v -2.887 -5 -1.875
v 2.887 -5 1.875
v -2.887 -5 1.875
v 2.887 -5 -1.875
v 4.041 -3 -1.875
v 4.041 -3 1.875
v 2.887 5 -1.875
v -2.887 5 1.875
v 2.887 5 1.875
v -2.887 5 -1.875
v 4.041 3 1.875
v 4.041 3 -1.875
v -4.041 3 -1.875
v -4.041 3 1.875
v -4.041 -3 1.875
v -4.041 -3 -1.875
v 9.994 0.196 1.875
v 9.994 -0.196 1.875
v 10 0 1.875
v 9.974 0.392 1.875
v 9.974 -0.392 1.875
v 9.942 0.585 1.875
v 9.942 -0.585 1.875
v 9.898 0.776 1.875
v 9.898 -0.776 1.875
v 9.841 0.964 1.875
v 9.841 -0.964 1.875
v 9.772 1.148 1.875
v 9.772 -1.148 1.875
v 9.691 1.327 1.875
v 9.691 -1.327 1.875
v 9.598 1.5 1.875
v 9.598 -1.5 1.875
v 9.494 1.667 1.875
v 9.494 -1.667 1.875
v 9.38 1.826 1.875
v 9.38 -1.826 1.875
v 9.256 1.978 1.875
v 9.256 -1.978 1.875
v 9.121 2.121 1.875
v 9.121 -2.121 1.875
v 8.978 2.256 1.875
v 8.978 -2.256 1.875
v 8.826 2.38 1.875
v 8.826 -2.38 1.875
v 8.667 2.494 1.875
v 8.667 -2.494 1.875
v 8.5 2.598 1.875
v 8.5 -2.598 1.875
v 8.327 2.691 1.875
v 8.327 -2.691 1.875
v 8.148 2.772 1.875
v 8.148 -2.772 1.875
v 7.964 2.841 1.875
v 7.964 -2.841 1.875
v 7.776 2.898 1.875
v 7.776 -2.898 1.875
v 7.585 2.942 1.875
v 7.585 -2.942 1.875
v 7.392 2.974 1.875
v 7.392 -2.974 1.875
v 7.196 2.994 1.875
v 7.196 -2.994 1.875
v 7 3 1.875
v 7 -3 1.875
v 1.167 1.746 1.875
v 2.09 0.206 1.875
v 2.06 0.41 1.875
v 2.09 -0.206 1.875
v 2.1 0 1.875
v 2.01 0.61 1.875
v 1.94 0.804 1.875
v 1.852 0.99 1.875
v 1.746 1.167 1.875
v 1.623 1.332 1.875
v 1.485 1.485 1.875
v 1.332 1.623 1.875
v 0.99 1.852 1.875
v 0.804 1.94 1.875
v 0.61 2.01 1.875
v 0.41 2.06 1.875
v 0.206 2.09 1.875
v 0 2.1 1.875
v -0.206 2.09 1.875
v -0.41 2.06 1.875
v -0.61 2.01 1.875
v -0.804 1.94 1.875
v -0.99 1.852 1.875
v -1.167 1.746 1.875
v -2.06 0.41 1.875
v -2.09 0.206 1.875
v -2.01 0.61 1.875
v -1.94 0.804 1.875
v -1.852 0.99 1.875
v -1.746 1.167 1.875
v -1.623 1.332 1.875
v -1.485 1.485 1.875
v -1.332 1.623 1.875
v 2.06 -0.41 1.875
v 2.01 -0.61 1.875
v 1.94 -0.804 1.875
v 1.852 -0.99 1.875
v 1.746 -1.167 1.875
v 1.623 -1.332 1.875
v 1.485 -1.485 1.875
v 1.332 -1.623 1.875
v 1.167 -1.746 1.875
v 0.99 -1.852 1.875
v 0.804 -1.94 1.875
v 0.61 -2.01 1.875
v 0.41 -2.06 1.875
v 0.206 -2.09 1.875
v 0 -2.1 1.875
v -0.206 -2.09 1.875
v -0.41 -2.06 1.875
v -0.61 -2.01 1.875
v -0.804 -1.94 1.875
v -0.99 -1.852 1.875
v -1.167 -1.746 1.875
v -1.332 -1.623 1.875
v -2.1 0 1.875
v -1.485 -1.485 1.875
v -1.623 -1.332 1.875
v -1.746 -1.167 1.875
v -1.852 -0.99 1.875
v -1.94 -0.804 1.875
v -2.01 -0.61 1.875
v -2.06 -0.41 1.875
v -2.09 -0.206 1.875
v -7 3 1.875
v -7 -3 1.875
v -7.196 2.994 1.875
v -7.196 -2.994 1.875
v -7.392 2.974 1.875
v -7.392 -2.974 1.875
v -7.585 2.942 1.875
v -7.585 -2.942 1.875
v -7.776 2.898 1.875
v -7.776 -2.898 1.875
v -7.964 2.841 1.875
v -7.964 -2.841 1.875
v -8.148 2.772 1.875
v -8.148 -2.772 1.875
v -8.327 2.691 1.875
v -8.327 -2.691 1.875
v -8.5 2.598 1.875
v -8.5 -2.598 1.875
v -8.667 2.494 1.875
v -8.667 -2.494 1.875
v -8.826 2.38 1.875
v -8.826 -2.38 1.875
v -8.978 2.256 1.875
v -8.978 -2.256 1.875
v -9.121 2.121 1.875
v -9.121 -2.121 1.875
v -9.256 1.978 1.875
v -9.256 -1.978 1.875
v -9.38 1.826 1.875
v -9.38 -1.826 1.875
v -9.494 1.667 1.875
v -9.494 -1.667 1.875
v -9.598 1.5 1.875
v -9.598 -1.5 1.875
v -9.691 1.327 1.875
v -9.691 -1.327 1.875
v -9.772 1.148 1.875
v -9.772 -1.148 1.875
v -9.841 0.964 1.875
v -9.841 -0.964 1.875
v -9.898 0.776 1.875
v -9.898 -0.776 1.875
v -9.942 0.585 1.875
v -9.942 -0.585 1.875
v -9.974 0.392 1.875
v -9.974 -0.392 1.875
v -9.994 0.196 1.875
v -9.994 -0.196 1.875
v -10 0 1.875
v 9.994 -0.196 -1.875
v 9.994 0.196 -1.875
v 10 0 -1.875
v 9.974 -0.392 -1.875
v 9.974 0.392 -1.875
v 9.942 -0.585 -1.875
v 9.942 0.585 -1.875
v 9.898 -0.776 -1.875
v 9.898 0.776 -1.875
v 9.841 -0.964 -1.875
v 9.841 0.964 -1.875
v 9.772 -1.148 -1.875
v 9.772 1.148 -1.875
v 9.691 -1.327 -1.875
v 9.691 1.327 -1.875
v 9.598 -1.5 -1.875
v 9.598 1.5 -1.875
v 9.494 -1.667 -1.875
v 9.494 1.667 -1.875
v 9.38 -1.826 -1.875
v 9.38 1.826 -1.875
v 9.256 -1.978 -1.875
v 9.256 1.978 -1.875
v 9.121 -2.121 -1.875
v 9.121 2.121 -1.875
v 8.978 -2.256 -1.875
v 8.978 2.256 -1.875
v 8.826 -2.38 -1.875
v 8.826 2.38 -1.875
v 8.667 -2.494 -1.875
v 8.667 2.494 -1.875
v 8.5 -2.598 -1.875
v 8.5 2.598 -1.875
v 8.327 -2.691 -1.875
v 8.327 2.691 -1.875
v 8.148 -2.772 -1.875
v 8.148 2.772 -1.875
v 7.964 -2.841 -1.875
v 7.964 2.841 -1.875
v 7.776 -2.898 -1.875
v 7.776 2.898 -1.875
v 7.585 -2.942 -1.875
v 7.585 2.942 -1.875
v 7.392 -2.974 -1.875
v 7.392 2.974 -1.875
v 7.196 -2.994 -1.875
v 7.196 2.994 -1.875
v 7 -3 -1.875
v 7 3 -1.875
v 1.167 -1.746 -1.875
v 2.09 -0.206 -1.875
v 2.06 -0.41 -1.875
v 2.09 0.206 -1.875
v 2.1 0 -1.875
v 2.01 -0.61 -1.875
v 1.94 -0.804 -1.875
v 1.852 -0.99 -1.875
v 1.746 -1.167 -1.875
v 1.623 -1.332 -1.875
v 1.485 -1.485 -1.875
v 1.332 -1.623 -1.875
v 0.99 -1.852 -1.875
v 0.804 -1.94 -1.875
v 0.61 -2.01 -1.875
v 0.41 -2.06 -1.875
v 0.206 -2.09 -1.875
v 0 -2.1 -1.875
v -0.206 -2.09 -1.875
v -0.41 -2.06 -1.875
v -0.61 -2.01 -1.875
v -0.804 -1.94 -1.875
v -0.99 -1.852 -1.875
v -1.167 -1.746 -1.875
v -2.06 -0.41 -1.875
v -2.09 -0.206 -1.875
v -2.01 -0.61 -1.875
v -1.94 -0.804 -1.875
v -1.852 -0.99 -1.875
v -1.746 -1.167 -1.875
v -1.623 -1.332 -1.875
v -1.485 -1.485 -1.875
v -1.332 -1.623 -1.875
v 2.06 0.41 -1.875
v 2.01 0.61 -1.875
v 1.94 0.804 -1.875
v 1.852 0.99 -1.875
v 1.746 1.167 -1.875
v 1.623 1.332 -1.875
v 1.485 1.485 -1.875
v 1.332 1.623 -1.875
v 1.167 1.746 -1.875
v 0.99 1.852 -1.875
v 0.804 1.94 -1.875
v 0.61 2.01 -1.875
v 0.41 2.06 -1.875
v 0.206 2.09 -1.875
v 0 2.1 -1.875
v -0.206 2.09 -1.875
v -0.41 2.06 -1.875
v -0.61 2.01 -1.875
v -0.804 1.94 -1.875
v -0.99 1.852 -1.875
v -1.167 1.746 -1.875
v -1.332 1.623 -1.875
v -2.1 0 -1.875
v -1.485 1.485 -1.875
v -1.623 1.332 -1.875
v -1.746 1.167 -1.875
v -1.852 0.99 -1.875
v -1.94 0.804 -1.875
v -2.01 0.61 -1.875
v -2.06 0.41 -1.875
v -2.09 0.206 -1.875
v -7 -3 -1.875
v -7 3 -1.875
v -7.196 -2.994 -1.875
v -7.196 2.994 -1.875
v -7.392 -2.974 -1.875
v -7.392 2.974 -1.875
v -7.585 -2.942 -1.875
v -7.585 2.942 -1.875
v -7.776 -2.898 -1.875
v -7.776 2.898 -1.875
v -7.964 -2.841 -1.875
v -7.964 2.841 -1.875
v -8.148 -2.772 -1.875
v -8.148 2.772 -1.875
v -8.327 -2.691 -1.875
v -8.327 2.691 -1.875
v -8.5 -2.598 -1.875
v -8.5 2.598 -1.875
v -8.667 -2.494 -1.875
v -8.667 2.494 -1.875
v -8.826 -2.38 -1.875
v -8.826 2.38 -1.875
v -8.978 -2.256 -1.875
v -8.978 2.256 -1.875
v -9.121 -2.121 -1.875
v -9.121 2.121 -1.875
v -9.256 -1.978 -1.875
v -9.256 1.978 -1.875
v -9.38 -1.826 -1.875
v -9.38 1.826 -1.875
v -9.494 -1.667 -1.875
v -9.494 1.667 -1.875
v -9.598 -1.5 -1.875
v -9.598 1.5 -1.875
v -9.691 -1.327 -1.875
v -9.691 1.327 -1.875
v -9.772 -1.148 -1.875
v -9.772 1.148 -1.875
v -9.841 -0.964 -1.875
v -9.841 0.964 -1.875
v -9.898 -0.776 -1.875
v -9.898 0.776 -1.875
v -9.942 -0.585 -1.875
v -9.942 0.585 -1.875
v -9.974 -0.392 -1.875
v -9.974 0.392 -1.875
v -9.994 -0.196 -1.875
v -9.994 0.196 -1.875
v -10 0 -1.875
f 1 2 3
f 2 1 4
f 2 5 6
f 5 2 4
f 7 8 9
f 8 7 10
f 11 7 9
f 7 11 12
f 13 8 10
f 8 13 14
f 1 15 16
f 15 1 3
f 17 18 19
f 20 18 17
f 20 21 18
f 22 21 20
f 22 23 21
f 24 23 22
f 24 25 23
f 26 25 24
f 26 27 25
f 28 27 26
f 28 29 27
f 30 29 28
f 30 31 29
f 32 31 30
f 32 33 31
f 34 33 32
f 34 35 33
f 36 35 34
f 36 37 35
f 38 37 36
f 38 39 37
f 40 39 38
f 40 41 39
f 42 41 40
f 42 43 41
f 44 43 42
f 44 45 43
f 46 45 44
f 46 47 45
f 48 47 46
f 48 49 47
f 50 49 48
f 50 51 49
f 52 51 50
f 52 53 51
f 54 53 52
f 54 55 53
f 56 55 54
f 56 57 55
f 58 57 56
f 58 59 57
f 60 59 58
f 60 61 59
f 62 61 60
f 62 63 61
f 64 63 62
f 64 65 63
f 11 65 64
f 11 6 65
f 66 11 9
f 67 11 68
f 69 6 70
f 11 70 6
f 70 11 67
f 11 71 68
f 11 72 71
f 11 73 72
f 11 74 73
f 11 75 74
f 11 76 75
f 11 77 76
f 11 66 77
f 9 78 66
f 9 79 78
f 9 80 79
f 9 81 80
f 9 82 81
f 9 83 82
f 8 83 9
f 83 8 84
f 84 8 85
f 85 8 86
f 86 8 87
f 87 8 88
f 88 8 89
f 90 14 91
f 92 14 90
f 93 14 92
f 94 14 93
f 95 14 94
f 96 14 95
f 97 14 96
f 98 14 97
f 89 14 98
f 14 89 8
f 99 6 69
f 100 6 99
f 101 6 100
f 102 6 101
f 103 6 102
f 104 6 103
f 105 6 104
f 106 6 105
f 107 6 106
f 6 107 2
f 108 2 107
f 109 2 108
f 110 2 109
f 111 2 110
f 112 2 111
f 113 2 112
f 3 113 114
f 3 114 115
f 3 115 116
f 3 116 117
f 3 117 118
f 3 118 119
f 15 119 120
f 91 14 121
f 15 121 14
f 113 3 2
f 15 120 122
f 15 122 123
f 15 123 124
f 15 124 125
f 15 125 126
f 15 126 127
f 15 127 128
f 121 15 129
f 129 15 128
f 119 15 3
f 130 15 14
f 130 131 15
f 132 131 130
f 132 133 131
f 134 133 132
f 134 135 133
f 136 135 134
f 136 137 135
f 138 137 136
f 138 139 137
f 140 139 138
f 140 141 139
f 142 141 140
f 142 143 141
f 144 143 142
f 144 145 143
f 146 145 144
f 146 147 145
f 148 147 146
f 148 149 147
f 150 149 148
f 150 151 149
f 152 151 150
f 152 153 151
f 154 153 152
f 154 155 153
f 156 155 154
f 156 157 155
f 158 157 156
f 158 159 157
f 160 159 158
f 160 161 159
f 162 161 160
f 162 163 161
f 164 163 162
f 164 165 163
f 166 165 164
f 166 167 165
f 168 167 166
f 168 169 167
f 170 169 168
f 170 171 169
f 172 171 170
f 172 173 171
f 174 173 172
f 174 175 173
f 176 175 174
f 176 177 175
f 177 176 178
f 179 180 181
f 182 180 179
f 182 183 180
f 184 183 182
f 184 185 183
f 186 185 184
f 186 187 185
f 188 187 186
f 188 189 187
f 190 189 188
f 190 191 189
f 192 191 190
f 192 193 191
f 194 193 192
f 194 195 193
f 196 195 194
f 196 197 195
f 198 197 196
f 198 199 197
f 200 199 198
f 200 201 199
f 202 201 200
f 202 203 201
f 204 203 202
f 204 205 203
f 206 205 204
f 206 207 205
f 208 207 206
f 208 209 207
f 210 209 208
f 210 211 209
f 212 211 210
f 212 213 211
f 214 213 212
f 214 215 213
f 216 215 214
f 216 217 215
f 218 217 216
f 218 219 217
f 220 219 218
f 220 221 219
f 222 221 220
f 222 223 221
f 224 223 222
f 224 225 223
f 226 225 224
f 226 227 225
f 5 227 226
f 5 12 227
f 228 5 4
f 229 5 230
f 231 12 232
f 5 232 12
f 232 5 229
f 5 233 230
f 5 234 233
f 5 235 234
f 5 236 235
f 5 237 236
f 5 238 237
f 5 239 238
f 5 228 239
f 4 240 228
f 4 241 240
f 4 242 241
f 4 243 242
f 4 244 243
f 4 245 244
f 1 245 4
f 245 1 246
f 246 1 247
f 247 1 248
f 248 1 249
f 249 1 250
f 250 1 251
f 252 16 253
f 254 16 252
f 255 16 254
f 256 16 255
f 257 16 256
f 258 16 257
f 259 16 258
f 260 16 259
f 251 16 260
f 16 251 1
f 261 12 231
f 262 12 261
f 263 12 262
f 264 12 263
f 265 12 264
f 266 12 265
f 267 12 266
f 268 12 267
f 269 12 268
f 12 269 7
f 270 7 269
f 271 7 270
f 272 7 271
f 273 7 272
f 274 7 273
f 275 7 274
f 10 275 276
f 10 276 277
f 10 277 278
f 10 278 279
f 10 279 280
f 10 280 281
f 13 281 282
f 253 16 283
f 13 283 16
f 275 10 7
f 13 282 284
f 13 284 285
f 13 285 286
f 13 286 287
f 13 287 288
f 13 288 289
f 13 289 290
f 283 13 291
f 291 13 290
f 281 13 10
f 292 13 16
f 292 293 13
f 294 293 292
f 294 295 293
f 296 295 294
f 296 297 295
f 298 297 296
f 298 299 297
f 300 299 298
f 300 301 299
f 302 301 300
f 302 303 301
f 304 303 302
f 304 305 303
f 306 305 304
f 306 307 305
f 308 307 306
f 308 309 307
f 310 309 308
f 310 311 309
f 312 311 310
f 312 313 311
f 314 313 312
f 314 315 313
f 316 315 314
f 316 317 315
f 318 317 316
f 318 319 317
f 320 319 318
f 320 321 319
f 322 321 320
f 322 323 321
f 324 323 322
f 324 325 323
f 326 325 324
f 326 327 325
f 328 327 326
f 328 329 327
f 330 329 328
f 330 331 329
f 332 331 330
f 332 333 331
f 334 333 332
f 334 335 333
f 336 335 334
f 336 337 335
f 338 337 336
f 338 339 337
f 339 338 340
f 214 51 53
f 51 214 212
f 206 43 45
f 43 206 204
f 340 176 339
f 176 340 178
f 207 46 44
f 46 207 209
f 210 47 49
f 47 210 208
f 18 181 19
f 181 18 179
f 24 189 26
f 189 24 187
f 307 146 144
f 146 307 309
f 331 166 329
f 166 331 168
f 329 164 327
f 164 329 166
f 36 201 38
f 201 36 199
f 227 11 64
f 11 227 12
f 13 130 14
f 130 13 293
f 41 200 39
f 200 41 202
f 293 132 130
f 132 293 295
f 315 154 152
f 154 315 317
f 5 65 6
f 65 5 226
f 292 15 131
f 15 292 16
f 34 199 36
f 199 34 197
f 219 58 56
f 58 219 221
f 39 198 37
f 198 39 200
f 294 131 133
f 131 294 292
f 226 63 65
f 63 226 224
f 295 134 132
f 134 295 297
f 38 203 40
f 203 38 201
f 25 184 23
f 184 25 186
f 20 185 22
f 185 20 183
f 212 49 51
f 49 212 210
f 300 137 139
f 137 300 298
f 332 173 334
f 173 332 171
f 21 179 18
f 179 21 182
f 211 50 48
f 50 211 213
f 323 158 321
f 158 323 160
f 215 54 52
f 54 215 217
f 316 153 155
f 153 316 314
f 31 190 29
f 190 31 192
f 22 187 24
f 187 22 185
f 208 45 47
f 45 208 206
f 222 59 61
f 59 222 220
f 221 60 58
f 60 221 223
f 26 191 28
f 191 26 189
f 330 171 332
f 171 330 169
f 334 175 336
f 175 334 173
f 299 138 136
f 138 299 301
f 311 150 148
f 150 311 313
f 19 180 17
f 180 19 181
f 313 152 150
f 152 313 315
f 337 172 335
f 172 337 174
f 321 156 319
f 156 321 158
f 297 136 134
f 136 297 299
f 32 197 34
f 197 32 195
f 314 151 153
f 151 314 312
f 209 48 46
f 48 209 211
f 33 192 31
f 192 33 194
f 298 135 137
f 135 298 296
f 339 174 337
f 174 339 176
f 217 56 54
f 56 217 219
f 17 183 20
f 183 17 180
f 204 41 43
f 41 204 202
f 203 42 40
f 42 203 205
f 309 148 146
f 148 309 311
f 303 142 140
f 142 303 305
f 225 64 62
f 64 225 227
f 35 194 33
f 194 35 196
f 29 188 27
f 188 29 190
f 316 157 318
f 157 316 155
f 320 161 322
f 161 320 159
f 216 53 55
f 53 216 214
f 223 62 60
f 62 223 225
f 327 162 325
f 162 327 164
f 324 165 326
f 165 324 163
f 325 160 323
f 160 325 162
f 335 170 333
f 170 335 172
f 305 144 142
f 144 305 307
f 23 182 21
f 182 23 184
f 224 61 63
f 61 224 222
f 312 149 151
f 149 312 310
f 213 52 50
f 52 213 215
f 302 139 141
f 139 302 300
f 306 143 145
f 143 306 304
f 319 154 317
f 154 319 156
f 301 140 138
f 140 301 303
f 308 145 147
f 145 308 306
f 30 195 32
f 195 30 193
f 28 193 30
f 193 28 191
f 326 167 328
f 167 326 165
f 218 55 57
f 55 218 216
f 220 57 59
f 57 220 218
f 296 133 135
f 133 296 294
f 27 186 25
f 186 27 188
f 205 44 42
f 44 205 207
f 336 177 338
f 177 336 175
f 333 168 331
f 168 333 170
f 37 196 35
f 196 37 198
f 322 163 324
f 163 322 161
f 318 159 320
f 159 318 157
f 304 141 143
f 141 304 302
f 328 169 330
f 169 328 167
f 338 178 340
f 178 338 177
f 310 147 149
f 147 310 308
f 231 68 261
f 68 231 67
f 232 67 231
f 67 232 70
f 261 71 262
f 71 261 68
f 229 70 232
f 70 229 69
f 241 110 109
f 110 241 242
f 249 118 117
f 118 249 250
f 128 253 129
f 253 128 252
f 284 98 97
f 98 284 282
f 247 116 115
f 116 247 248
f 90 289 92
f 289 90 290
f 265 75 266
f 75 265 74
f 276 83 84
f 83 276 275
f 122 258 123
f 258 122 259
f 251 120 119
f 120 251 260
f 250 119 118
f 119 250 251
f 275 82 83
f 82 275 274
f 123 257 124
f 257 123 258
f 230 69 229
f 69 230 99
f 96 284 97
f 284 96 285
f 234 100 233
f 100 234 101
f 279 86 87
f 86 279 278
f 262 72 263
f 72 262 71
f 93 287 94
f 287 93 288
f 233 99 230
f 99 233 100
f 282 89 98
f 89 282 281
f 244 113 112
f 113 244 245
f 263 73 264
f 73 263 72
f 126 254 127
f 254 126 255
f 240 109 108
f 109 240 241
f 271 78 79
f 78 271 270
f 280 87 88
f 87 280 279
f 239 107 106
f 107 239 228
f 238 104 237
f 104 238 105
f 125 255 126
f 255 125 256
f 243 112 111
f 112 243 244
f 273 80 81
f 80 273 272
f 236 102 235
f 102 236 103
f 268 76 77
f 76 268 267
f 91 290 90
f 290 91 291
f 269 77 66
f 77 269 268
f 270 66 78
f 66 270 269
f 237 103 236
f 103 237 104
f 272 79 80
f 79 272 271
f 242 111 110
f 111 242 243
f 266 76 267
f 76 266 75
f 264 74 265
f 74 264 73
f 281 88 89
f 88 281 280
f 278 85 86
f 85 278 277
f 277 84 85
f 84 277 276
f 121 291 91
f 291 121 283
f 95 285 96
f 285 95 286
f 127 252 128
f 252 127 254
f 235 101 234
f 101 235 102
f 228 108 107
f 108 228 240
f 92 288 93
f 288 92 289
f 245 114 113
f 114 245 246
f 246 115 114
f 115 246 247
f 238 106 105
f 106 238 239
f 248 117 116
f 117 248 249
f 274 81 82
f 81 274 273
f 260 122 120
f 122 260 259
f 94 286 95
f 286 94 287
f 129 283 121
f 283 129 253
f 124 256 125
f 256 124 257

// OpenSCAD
// Wing nut for M4 screw
// Targets: 4.0mm screw (clearance hole), 10.0mm across flats, 3.75mm thick
$fn = 96;

// Parameters
thread_diameter   = 4.0;   // screw major diameter
thread_clearance  = 0.2;   // clearance added to hole diameter
across_flats      = 10.0;  // hex across flats
thickness         = 3.75;  // overall thickness (Z)

wing_span         = 24.0;  // overall tip-to-tip span (X)
wing_width        = 6.0;   // wing width (Y)
wing_tip_radius   = 3.0;   // rounding at wing tips (in XY)
wing_root_radius  = 2.0;   // rounding at wing roots (in XY)

eps = 0.02;

// Derived
hex_R = across_flats / (2 * cos(30));                 // circumradius for $fn=6 cylinder
hole_r = (thread_diameter + thread_clearance) / 2;
core_half = across_flats / 2;
wing_len_each = max(0, wing_span/2 - core_half);      // length beyond hex on each side

module rounded_bar_x(len, wid, r) {
    // 2D rounded rectangle (capsule-like) along X, then extruded in Z
    // Ensures r is valid
    rr = min(r, wid/2, len/2);
    hull() {
        translate([-(len/2 - rr), 0]) circle(r=rr);
        translate([ (len/2 - rr), 0]) circle(r=rr);
    }
}

module wingnut() {
    difference() {
        union() {
            // Hex core
            cylinder(r=hex_R, h=thickness, center=true, $fn=6);

            // Two wings as a single connected rounded bar across X
            // Overlaps into the hex by wing_root_radius to guarantee connectivity
            if (wing_len_each > 0) {
                linear_extrude(height=thickness, center=true)
                    rounded_bar_x(
                        len = wing_span - 2*wing_root_radius,
                        wid = wing_width,
                        r   = wing_tip_radius
                    );
            }
        }

        // Central through-hole for M4 (clearance)
        cylinder(r=hole_r, h=thickness + 2, center=true, $fn=64);
    }
}

wingnut();
